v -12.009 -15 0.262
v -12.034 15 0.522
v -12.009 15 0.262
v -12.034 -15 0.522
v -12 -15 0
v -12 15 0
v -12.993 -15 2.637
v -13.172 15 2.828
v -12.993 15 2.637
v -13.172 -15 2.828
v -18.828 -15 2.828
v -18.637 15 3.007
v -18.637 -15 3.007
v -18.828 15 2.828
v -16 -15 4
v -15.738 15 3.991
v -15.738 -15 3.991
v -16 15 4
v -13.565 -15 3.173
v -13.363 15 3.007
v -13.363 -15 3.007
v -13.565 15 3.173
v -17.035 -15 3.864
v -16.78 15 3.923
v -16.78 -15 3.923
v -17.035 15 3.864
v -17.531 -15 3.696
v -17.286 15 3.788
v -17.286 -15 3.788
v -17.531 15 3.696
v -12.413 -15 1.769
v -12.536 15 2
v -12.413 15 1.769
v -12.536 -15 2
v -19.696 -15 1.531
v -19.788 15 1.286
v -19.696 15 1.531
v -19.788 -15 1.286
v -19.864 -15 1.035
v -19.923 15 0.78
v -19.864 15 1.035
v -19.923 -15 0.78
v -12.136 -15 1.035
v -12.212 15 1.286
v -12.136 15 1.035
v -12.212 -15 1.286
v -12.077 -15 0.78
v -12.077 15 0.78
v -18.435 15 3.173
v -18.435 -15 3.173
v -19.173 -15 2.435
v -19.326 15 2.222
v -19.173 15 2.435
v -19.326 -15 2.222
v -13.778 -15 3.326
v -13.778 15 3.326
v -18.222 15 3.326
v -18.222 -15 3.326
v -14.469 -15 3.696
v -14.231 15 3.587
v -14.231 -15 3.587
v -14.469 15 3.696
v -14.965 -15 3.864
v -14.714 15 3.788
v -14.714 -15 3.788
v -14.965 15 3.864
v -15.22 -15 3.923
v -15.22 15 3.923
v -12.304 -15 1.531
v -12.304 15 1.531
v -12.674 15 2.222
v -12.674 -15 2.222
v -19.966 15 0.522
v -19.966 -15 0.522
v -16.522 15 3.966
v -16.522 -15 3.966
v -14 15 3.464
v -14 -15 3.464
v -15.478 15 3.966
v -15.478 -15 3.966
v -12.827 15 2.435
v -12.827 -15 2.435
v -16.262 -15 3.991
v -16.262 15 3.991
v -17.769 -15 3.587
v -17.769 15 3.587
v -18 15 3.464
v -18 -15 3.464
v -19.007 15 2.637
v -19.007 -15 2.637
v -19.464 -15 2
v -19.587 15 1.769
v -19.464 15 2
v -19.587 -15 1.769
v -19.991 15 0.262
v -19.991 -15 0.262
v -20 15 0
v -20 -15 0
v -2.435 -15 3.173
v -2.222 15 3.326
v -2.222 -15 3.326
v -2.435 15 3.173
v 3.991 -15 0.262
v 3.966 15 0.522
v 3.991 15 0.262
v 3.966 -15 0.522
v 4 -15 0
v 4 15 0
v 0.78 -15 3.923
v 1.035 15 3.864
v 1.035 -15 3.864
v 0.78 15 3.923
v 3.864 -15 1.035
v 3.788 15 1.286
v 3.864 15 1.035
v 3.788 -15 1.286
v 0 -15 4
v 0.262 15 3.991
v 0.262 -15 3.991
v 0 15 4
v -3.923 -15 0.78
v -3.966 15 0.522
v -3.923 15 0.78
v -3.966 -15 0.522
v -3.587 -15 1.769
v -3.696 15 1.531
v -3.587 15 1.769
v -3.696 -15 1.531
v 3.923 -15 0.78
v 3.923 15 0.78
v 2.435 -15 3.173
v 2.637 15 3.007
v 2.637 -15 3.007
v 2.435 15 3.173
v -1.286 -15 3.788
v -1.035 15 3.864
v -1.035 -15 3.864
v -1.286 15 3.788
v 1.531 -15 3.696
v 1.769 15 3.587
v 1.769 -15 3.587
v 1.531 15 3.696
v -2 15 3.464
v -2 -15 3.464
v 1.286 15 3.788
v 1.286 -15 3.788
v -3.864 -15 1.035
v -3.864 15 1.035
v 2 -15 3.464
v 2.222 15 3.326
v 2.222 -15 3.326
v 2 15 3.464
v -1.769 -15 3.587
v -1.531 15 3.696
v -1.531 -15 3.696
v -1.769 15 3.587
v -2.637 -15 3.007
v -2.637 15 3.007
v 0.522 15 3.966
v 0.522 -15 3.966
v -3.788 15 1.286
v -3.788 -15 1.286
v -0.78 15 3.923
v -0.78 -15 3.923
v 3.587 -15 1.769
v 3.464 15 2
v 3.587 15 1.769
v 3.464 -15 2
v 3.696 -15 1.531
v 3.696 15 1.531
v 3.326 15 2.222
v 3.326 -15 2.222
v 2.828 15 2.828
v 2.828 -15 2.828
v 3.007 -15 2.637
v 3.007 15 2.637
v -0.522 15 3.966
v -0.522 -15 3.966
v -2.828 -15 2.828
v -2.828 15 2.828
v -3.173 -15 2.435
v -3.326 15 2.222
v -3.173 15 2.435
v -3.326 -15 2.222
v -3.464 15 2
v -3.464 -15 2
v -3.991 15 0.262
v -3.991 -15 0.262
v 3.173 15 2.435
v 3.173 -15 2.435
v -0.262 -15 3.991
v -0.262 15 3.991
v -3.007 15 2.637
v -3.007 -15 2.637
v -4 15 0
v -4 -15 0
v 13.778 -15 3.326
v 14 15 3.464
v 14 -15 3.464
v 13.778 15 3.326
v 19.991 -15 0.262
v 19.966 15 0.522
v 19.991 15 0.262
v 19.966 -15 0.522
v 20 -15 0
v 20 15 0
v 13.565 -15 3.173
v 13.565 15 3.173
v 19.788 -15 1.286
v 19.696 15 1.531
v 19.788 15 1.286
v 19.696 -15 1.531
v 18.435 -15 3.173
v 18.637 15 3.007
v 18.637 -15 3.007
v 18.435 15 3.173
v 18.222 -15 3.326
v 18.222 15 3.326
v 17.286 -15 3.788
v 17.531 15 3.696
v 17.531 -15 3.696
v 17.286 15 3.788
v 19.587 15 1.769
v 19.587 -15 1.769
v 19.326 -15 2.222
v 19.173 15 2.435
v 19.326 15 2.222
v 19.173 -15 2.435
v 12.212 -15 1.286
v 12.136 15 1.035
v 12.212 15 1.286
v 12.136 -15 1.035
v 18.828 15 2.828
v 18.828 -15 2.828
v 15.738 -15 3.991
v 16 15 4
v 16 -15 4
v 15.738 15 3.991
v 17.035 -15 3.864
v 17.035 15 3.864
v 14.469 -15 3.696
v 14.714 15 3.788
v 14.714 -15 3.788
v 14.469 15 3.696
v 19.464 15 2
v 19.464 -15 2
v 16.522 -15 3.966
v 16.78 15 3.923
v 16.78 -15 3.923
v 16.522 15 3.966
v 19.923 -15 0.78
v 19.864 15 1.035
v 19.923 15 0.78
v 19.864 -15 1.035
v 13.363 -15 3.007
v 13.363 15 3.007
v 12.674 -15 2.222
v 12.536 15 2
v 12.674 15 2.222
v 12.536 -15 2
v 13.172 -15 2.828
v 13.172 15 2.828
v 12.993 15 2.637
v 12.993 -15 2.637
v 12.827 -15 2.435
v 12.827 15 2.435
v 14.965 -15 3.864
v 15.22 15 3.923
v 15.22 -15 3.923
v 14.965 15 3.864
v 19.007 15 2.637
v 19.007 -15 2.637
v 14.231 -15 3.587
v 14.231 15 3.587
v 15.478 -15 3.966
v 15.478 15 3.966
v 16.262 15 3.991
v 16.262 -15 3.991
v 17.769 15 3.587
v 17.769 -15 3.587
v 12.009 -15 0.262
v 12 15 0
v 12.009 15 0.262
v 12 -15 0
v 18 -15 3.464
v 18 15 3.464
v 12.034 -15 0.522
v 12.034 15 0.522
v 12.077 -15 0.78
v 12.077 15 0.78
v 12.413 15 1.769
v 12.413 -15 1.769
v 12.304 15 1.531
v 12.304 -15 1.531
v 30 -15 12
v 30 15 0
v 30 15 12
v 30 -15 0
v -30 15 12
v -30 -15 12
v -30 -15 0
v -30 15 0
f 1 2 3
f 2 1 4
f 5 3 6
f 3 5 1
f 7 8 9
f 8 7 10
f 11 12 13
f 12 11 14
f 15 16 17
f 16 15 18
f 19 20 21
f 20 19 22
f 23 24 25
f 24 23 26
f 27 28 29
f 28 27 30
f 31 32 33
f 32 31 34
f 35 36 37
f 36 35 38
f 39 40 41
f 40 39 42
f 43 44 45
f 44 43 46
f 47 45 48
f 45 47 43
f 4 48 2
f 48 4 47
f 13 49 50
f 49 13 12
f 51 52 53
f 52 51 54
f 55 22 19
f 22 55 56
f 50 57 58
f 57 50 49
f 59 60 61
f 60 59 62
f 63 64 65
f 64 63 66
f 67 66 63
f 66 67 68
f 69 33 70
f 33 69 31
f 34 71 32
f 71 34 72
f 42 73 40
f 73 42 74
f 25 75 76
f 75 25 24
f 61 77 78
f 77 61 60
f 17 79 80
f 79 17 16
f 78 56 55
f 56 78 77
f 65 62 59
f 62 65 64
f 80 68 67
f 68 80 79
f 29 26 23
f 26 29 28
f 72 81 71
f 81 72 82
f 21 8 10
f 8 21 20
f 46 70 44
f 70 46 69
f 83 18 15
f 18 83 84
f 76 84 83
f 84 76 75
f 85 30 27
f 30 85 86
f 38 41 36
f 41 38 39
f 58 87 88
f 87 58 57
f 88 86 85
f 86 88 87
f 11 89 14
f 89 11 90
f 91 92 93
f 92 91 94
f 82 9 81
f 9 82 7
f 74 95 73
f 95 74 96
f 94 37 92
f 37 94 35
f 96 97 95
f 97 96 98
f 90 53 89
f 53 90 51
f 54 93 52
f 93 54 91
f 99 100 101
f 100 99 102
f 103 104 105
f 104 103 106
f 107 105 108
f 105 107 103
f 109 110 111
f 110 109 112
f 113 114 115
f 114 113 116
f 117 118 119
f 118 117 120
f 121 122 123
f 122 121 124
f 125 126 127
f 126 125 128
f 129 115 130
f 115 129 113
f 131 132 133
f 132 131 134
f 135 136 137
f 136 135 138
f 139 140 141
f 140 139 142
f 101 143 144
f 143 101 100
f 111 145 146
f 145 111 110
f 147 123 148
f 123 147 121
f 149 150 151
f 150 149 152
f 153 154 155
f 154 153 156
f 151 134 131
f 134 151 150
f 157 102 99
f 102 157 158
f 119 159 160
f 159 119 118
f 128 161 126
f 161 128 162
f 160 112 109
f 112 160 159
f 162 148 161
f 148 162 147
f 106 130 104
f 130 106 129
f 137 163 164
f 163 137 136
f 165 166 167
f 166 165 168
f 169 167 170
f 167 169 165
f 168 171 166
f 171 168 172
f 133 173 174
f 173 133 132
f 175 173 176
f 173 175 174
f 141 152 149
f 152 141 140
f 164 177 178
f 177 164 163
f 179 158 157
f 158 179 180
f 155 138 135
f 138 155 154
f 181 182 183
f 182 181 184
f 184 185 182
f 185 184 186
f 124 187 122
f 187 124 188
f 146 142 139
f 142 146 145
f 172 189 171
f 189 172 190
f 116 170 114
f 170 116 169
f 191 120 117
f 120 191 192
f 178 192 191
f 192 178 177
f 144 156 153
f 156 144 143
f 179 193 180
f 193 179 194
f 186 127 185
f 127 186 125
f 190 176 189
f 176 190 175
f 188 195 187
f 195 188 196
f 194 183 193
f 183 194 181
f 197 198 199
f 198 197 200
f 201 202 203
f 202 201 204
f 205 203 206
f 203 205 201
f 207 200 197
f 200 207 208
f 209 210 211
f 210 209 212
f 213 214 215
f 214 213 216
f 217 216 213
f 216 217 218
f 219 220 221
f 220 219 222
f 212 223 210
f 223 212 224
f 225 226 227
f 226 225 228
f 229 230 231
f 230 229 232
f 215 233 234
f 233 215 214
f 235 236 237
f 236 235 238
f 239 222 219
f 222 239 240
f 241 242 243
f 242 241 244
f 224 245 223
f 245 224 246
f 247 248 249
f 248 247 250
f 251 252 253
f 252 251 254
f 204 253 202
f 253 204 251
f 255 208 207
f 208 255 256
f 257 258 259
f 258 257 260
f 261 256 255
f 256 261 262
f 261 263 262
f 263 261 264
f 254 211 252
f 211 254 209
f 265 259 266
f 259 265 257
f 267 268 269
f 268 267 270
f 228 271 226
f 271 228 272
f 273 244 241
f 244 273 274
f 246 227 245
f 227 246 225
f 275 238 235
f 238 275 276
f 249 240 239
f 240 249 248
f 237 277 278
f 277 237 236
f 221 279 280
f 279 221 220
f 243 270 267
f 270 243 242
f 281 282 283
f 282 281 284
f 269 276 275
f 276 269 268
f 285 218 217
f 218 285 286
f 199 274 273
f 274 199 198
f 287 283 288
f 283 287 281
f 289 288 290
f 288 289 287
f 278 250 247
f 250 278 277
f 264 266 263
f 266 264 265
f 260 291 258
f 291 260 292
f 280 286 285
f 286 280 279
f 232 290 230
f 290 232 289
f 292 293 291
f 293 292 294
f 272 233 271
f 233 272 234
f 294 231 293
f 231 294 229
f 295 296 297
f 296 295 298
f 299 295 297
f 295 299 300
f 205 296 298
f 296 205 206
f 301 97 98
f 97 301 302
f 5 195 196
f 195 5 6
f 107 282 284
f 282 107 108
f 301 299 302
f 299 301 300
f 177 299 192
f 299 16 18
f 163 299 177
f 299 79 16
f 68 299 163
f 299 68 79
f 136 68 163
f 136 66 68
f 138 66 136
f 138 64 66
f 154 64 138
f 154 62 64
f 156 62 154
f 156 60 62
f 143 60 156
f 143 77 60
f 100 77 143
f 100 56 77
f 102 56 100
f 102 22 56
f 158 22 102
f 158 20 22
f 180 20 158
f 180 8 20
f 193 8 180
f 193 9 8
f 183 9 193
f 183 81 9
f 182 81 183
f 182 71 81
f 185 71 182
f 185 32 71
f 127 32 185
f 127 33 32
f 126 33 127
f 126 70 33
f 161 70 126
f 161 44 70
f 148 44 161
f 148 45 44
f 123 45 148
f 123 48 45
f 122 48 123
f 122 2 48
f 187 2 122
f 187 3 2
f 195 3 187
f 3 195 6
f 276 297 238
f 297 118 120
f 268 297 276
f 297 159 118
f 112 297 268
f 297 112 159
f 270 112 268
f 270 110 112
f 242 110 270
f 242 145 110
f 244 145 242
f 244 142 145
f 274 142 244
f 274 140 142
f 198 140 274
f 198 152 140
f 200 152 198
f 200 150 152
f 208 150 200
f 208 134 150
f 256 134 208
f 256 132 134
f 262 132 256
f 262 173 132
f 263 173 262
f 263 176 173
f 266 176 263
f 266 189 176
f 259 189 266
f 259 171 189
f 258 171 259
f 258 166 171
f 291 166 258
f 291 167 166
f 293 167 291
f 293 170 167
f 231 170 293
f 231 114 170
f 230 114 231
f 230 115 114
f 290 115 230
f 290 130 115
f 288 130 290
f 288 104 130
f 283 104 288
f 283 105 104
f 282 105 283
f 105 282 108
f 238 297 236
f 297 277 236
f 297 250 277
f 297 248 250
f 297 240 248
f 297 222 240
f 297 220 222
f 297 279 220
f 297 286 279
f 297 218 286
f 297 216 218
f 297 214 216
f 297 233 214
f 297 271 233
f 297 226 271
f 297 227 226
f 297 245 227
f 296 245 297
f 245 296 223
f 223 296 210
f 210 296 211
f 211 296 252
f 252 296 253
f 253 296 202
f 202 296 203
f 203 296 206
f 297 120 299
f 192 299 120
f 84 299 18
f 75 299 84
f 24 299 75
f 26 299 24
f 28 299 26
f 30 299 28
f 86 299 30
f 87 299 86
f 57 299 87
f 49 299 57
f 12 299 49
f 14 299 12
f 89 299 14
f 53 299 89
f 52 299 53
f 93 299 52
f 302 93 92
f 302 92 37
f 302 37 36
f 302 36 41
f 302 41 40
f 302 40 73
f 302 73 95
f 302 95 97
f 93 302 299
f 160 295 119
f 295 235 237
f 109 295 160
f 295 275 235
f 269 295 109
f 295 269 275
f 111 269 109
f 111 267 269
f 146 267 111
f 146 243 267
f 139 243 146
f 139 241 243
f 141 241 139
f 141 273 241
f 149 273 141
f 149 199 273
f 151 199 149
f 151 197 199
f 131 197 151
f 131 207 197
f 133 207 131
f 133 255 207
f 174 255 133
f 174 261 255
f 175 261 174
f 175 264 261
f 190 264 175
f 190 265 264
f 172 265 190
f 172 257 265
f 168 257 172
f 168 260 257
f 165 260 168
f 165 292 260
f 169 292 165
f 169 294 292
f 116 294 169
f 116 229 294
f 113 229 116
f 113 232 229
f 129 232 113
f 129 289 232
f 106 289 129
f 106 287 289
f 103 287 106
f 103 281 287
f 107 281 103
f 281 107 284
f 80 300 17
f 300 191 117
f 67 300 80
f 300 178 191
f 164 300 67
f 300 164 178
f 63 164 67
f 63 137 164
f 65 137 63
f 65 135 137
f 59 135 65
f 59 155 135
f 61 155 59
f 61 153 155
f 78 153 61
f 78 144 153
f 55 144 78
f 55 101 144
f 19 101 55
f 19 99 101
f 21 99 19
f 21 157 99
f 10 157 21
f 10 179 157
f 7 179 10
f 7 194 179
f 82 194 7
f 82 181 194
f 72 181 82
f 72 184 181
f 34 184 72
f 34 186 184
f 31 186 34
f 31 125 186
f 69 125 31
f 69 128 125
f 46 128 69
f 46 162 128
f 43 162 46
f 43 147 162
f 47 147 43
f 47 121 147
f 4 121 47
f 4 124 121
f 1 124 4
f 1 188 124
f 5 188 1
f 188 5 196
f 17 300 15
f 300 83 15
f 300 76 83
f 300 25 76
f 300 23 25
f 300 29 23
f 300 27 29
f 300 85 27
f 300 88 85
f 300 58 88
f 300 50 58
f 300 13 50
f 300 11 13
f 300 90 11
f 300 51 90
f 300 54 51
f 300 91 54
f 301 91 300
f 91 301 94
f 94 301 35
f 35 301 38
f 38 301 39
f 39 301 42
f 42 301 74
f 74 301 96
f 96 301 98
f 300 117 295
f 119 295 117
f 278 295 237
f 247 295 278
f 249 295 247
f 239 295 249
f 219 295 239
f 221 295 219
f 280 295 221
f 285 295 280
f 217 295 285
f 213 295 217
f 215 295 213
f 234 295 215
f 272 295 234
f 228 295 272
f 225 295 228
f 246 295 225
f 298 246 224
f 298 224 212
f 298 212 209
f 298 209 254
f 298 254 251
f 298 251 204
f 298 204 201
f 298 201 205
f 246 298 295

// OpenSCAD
// Cable bridge for routing cables under a bench mat
// Print orientation: flat on bed, tunnels open at floor level

// ---- Block dimensions ----
block_length = 60;   // X length (mm)
block_width  = 30;   // Y width (mm)
block_height = 12;   // Z height (mm)

// ---- Tunnel dimensions ----
tunnel_count   = 3;   // number of semicircular tunnels
tunnel_dia     = 8;   // tunnel cylinder diameter (mm)
tunnel_pitch   = 16;  // centre-to-centre spacing along X (mm)
cut_extra      = 1;   // overshoot of cutters past faces (mm)

$fn = 96;

difference() {
    // Main block, centred in X/Y, sitting on z = 0
    translate([-block_length/2, -block_width/2, 0])
        cube([block_length, block_width, block_height]);

    // Semicircular tunnels: full cylinders with axis at z = 0 along Y;
    // the lower half lies below the bed, leaving a half-round channel.
    for (i = [0 : tunnel_count - 1]) {
        x = (i - (tunnel_count - 1) / 2) * tunnel_pitch;
        translate([x, 0, 0])
            rotate([90, 0, 0])
                cylinder(d = tunnel_dia,
                         h = block_width + 2*cut_extra,
                         center = true);
    }
}
